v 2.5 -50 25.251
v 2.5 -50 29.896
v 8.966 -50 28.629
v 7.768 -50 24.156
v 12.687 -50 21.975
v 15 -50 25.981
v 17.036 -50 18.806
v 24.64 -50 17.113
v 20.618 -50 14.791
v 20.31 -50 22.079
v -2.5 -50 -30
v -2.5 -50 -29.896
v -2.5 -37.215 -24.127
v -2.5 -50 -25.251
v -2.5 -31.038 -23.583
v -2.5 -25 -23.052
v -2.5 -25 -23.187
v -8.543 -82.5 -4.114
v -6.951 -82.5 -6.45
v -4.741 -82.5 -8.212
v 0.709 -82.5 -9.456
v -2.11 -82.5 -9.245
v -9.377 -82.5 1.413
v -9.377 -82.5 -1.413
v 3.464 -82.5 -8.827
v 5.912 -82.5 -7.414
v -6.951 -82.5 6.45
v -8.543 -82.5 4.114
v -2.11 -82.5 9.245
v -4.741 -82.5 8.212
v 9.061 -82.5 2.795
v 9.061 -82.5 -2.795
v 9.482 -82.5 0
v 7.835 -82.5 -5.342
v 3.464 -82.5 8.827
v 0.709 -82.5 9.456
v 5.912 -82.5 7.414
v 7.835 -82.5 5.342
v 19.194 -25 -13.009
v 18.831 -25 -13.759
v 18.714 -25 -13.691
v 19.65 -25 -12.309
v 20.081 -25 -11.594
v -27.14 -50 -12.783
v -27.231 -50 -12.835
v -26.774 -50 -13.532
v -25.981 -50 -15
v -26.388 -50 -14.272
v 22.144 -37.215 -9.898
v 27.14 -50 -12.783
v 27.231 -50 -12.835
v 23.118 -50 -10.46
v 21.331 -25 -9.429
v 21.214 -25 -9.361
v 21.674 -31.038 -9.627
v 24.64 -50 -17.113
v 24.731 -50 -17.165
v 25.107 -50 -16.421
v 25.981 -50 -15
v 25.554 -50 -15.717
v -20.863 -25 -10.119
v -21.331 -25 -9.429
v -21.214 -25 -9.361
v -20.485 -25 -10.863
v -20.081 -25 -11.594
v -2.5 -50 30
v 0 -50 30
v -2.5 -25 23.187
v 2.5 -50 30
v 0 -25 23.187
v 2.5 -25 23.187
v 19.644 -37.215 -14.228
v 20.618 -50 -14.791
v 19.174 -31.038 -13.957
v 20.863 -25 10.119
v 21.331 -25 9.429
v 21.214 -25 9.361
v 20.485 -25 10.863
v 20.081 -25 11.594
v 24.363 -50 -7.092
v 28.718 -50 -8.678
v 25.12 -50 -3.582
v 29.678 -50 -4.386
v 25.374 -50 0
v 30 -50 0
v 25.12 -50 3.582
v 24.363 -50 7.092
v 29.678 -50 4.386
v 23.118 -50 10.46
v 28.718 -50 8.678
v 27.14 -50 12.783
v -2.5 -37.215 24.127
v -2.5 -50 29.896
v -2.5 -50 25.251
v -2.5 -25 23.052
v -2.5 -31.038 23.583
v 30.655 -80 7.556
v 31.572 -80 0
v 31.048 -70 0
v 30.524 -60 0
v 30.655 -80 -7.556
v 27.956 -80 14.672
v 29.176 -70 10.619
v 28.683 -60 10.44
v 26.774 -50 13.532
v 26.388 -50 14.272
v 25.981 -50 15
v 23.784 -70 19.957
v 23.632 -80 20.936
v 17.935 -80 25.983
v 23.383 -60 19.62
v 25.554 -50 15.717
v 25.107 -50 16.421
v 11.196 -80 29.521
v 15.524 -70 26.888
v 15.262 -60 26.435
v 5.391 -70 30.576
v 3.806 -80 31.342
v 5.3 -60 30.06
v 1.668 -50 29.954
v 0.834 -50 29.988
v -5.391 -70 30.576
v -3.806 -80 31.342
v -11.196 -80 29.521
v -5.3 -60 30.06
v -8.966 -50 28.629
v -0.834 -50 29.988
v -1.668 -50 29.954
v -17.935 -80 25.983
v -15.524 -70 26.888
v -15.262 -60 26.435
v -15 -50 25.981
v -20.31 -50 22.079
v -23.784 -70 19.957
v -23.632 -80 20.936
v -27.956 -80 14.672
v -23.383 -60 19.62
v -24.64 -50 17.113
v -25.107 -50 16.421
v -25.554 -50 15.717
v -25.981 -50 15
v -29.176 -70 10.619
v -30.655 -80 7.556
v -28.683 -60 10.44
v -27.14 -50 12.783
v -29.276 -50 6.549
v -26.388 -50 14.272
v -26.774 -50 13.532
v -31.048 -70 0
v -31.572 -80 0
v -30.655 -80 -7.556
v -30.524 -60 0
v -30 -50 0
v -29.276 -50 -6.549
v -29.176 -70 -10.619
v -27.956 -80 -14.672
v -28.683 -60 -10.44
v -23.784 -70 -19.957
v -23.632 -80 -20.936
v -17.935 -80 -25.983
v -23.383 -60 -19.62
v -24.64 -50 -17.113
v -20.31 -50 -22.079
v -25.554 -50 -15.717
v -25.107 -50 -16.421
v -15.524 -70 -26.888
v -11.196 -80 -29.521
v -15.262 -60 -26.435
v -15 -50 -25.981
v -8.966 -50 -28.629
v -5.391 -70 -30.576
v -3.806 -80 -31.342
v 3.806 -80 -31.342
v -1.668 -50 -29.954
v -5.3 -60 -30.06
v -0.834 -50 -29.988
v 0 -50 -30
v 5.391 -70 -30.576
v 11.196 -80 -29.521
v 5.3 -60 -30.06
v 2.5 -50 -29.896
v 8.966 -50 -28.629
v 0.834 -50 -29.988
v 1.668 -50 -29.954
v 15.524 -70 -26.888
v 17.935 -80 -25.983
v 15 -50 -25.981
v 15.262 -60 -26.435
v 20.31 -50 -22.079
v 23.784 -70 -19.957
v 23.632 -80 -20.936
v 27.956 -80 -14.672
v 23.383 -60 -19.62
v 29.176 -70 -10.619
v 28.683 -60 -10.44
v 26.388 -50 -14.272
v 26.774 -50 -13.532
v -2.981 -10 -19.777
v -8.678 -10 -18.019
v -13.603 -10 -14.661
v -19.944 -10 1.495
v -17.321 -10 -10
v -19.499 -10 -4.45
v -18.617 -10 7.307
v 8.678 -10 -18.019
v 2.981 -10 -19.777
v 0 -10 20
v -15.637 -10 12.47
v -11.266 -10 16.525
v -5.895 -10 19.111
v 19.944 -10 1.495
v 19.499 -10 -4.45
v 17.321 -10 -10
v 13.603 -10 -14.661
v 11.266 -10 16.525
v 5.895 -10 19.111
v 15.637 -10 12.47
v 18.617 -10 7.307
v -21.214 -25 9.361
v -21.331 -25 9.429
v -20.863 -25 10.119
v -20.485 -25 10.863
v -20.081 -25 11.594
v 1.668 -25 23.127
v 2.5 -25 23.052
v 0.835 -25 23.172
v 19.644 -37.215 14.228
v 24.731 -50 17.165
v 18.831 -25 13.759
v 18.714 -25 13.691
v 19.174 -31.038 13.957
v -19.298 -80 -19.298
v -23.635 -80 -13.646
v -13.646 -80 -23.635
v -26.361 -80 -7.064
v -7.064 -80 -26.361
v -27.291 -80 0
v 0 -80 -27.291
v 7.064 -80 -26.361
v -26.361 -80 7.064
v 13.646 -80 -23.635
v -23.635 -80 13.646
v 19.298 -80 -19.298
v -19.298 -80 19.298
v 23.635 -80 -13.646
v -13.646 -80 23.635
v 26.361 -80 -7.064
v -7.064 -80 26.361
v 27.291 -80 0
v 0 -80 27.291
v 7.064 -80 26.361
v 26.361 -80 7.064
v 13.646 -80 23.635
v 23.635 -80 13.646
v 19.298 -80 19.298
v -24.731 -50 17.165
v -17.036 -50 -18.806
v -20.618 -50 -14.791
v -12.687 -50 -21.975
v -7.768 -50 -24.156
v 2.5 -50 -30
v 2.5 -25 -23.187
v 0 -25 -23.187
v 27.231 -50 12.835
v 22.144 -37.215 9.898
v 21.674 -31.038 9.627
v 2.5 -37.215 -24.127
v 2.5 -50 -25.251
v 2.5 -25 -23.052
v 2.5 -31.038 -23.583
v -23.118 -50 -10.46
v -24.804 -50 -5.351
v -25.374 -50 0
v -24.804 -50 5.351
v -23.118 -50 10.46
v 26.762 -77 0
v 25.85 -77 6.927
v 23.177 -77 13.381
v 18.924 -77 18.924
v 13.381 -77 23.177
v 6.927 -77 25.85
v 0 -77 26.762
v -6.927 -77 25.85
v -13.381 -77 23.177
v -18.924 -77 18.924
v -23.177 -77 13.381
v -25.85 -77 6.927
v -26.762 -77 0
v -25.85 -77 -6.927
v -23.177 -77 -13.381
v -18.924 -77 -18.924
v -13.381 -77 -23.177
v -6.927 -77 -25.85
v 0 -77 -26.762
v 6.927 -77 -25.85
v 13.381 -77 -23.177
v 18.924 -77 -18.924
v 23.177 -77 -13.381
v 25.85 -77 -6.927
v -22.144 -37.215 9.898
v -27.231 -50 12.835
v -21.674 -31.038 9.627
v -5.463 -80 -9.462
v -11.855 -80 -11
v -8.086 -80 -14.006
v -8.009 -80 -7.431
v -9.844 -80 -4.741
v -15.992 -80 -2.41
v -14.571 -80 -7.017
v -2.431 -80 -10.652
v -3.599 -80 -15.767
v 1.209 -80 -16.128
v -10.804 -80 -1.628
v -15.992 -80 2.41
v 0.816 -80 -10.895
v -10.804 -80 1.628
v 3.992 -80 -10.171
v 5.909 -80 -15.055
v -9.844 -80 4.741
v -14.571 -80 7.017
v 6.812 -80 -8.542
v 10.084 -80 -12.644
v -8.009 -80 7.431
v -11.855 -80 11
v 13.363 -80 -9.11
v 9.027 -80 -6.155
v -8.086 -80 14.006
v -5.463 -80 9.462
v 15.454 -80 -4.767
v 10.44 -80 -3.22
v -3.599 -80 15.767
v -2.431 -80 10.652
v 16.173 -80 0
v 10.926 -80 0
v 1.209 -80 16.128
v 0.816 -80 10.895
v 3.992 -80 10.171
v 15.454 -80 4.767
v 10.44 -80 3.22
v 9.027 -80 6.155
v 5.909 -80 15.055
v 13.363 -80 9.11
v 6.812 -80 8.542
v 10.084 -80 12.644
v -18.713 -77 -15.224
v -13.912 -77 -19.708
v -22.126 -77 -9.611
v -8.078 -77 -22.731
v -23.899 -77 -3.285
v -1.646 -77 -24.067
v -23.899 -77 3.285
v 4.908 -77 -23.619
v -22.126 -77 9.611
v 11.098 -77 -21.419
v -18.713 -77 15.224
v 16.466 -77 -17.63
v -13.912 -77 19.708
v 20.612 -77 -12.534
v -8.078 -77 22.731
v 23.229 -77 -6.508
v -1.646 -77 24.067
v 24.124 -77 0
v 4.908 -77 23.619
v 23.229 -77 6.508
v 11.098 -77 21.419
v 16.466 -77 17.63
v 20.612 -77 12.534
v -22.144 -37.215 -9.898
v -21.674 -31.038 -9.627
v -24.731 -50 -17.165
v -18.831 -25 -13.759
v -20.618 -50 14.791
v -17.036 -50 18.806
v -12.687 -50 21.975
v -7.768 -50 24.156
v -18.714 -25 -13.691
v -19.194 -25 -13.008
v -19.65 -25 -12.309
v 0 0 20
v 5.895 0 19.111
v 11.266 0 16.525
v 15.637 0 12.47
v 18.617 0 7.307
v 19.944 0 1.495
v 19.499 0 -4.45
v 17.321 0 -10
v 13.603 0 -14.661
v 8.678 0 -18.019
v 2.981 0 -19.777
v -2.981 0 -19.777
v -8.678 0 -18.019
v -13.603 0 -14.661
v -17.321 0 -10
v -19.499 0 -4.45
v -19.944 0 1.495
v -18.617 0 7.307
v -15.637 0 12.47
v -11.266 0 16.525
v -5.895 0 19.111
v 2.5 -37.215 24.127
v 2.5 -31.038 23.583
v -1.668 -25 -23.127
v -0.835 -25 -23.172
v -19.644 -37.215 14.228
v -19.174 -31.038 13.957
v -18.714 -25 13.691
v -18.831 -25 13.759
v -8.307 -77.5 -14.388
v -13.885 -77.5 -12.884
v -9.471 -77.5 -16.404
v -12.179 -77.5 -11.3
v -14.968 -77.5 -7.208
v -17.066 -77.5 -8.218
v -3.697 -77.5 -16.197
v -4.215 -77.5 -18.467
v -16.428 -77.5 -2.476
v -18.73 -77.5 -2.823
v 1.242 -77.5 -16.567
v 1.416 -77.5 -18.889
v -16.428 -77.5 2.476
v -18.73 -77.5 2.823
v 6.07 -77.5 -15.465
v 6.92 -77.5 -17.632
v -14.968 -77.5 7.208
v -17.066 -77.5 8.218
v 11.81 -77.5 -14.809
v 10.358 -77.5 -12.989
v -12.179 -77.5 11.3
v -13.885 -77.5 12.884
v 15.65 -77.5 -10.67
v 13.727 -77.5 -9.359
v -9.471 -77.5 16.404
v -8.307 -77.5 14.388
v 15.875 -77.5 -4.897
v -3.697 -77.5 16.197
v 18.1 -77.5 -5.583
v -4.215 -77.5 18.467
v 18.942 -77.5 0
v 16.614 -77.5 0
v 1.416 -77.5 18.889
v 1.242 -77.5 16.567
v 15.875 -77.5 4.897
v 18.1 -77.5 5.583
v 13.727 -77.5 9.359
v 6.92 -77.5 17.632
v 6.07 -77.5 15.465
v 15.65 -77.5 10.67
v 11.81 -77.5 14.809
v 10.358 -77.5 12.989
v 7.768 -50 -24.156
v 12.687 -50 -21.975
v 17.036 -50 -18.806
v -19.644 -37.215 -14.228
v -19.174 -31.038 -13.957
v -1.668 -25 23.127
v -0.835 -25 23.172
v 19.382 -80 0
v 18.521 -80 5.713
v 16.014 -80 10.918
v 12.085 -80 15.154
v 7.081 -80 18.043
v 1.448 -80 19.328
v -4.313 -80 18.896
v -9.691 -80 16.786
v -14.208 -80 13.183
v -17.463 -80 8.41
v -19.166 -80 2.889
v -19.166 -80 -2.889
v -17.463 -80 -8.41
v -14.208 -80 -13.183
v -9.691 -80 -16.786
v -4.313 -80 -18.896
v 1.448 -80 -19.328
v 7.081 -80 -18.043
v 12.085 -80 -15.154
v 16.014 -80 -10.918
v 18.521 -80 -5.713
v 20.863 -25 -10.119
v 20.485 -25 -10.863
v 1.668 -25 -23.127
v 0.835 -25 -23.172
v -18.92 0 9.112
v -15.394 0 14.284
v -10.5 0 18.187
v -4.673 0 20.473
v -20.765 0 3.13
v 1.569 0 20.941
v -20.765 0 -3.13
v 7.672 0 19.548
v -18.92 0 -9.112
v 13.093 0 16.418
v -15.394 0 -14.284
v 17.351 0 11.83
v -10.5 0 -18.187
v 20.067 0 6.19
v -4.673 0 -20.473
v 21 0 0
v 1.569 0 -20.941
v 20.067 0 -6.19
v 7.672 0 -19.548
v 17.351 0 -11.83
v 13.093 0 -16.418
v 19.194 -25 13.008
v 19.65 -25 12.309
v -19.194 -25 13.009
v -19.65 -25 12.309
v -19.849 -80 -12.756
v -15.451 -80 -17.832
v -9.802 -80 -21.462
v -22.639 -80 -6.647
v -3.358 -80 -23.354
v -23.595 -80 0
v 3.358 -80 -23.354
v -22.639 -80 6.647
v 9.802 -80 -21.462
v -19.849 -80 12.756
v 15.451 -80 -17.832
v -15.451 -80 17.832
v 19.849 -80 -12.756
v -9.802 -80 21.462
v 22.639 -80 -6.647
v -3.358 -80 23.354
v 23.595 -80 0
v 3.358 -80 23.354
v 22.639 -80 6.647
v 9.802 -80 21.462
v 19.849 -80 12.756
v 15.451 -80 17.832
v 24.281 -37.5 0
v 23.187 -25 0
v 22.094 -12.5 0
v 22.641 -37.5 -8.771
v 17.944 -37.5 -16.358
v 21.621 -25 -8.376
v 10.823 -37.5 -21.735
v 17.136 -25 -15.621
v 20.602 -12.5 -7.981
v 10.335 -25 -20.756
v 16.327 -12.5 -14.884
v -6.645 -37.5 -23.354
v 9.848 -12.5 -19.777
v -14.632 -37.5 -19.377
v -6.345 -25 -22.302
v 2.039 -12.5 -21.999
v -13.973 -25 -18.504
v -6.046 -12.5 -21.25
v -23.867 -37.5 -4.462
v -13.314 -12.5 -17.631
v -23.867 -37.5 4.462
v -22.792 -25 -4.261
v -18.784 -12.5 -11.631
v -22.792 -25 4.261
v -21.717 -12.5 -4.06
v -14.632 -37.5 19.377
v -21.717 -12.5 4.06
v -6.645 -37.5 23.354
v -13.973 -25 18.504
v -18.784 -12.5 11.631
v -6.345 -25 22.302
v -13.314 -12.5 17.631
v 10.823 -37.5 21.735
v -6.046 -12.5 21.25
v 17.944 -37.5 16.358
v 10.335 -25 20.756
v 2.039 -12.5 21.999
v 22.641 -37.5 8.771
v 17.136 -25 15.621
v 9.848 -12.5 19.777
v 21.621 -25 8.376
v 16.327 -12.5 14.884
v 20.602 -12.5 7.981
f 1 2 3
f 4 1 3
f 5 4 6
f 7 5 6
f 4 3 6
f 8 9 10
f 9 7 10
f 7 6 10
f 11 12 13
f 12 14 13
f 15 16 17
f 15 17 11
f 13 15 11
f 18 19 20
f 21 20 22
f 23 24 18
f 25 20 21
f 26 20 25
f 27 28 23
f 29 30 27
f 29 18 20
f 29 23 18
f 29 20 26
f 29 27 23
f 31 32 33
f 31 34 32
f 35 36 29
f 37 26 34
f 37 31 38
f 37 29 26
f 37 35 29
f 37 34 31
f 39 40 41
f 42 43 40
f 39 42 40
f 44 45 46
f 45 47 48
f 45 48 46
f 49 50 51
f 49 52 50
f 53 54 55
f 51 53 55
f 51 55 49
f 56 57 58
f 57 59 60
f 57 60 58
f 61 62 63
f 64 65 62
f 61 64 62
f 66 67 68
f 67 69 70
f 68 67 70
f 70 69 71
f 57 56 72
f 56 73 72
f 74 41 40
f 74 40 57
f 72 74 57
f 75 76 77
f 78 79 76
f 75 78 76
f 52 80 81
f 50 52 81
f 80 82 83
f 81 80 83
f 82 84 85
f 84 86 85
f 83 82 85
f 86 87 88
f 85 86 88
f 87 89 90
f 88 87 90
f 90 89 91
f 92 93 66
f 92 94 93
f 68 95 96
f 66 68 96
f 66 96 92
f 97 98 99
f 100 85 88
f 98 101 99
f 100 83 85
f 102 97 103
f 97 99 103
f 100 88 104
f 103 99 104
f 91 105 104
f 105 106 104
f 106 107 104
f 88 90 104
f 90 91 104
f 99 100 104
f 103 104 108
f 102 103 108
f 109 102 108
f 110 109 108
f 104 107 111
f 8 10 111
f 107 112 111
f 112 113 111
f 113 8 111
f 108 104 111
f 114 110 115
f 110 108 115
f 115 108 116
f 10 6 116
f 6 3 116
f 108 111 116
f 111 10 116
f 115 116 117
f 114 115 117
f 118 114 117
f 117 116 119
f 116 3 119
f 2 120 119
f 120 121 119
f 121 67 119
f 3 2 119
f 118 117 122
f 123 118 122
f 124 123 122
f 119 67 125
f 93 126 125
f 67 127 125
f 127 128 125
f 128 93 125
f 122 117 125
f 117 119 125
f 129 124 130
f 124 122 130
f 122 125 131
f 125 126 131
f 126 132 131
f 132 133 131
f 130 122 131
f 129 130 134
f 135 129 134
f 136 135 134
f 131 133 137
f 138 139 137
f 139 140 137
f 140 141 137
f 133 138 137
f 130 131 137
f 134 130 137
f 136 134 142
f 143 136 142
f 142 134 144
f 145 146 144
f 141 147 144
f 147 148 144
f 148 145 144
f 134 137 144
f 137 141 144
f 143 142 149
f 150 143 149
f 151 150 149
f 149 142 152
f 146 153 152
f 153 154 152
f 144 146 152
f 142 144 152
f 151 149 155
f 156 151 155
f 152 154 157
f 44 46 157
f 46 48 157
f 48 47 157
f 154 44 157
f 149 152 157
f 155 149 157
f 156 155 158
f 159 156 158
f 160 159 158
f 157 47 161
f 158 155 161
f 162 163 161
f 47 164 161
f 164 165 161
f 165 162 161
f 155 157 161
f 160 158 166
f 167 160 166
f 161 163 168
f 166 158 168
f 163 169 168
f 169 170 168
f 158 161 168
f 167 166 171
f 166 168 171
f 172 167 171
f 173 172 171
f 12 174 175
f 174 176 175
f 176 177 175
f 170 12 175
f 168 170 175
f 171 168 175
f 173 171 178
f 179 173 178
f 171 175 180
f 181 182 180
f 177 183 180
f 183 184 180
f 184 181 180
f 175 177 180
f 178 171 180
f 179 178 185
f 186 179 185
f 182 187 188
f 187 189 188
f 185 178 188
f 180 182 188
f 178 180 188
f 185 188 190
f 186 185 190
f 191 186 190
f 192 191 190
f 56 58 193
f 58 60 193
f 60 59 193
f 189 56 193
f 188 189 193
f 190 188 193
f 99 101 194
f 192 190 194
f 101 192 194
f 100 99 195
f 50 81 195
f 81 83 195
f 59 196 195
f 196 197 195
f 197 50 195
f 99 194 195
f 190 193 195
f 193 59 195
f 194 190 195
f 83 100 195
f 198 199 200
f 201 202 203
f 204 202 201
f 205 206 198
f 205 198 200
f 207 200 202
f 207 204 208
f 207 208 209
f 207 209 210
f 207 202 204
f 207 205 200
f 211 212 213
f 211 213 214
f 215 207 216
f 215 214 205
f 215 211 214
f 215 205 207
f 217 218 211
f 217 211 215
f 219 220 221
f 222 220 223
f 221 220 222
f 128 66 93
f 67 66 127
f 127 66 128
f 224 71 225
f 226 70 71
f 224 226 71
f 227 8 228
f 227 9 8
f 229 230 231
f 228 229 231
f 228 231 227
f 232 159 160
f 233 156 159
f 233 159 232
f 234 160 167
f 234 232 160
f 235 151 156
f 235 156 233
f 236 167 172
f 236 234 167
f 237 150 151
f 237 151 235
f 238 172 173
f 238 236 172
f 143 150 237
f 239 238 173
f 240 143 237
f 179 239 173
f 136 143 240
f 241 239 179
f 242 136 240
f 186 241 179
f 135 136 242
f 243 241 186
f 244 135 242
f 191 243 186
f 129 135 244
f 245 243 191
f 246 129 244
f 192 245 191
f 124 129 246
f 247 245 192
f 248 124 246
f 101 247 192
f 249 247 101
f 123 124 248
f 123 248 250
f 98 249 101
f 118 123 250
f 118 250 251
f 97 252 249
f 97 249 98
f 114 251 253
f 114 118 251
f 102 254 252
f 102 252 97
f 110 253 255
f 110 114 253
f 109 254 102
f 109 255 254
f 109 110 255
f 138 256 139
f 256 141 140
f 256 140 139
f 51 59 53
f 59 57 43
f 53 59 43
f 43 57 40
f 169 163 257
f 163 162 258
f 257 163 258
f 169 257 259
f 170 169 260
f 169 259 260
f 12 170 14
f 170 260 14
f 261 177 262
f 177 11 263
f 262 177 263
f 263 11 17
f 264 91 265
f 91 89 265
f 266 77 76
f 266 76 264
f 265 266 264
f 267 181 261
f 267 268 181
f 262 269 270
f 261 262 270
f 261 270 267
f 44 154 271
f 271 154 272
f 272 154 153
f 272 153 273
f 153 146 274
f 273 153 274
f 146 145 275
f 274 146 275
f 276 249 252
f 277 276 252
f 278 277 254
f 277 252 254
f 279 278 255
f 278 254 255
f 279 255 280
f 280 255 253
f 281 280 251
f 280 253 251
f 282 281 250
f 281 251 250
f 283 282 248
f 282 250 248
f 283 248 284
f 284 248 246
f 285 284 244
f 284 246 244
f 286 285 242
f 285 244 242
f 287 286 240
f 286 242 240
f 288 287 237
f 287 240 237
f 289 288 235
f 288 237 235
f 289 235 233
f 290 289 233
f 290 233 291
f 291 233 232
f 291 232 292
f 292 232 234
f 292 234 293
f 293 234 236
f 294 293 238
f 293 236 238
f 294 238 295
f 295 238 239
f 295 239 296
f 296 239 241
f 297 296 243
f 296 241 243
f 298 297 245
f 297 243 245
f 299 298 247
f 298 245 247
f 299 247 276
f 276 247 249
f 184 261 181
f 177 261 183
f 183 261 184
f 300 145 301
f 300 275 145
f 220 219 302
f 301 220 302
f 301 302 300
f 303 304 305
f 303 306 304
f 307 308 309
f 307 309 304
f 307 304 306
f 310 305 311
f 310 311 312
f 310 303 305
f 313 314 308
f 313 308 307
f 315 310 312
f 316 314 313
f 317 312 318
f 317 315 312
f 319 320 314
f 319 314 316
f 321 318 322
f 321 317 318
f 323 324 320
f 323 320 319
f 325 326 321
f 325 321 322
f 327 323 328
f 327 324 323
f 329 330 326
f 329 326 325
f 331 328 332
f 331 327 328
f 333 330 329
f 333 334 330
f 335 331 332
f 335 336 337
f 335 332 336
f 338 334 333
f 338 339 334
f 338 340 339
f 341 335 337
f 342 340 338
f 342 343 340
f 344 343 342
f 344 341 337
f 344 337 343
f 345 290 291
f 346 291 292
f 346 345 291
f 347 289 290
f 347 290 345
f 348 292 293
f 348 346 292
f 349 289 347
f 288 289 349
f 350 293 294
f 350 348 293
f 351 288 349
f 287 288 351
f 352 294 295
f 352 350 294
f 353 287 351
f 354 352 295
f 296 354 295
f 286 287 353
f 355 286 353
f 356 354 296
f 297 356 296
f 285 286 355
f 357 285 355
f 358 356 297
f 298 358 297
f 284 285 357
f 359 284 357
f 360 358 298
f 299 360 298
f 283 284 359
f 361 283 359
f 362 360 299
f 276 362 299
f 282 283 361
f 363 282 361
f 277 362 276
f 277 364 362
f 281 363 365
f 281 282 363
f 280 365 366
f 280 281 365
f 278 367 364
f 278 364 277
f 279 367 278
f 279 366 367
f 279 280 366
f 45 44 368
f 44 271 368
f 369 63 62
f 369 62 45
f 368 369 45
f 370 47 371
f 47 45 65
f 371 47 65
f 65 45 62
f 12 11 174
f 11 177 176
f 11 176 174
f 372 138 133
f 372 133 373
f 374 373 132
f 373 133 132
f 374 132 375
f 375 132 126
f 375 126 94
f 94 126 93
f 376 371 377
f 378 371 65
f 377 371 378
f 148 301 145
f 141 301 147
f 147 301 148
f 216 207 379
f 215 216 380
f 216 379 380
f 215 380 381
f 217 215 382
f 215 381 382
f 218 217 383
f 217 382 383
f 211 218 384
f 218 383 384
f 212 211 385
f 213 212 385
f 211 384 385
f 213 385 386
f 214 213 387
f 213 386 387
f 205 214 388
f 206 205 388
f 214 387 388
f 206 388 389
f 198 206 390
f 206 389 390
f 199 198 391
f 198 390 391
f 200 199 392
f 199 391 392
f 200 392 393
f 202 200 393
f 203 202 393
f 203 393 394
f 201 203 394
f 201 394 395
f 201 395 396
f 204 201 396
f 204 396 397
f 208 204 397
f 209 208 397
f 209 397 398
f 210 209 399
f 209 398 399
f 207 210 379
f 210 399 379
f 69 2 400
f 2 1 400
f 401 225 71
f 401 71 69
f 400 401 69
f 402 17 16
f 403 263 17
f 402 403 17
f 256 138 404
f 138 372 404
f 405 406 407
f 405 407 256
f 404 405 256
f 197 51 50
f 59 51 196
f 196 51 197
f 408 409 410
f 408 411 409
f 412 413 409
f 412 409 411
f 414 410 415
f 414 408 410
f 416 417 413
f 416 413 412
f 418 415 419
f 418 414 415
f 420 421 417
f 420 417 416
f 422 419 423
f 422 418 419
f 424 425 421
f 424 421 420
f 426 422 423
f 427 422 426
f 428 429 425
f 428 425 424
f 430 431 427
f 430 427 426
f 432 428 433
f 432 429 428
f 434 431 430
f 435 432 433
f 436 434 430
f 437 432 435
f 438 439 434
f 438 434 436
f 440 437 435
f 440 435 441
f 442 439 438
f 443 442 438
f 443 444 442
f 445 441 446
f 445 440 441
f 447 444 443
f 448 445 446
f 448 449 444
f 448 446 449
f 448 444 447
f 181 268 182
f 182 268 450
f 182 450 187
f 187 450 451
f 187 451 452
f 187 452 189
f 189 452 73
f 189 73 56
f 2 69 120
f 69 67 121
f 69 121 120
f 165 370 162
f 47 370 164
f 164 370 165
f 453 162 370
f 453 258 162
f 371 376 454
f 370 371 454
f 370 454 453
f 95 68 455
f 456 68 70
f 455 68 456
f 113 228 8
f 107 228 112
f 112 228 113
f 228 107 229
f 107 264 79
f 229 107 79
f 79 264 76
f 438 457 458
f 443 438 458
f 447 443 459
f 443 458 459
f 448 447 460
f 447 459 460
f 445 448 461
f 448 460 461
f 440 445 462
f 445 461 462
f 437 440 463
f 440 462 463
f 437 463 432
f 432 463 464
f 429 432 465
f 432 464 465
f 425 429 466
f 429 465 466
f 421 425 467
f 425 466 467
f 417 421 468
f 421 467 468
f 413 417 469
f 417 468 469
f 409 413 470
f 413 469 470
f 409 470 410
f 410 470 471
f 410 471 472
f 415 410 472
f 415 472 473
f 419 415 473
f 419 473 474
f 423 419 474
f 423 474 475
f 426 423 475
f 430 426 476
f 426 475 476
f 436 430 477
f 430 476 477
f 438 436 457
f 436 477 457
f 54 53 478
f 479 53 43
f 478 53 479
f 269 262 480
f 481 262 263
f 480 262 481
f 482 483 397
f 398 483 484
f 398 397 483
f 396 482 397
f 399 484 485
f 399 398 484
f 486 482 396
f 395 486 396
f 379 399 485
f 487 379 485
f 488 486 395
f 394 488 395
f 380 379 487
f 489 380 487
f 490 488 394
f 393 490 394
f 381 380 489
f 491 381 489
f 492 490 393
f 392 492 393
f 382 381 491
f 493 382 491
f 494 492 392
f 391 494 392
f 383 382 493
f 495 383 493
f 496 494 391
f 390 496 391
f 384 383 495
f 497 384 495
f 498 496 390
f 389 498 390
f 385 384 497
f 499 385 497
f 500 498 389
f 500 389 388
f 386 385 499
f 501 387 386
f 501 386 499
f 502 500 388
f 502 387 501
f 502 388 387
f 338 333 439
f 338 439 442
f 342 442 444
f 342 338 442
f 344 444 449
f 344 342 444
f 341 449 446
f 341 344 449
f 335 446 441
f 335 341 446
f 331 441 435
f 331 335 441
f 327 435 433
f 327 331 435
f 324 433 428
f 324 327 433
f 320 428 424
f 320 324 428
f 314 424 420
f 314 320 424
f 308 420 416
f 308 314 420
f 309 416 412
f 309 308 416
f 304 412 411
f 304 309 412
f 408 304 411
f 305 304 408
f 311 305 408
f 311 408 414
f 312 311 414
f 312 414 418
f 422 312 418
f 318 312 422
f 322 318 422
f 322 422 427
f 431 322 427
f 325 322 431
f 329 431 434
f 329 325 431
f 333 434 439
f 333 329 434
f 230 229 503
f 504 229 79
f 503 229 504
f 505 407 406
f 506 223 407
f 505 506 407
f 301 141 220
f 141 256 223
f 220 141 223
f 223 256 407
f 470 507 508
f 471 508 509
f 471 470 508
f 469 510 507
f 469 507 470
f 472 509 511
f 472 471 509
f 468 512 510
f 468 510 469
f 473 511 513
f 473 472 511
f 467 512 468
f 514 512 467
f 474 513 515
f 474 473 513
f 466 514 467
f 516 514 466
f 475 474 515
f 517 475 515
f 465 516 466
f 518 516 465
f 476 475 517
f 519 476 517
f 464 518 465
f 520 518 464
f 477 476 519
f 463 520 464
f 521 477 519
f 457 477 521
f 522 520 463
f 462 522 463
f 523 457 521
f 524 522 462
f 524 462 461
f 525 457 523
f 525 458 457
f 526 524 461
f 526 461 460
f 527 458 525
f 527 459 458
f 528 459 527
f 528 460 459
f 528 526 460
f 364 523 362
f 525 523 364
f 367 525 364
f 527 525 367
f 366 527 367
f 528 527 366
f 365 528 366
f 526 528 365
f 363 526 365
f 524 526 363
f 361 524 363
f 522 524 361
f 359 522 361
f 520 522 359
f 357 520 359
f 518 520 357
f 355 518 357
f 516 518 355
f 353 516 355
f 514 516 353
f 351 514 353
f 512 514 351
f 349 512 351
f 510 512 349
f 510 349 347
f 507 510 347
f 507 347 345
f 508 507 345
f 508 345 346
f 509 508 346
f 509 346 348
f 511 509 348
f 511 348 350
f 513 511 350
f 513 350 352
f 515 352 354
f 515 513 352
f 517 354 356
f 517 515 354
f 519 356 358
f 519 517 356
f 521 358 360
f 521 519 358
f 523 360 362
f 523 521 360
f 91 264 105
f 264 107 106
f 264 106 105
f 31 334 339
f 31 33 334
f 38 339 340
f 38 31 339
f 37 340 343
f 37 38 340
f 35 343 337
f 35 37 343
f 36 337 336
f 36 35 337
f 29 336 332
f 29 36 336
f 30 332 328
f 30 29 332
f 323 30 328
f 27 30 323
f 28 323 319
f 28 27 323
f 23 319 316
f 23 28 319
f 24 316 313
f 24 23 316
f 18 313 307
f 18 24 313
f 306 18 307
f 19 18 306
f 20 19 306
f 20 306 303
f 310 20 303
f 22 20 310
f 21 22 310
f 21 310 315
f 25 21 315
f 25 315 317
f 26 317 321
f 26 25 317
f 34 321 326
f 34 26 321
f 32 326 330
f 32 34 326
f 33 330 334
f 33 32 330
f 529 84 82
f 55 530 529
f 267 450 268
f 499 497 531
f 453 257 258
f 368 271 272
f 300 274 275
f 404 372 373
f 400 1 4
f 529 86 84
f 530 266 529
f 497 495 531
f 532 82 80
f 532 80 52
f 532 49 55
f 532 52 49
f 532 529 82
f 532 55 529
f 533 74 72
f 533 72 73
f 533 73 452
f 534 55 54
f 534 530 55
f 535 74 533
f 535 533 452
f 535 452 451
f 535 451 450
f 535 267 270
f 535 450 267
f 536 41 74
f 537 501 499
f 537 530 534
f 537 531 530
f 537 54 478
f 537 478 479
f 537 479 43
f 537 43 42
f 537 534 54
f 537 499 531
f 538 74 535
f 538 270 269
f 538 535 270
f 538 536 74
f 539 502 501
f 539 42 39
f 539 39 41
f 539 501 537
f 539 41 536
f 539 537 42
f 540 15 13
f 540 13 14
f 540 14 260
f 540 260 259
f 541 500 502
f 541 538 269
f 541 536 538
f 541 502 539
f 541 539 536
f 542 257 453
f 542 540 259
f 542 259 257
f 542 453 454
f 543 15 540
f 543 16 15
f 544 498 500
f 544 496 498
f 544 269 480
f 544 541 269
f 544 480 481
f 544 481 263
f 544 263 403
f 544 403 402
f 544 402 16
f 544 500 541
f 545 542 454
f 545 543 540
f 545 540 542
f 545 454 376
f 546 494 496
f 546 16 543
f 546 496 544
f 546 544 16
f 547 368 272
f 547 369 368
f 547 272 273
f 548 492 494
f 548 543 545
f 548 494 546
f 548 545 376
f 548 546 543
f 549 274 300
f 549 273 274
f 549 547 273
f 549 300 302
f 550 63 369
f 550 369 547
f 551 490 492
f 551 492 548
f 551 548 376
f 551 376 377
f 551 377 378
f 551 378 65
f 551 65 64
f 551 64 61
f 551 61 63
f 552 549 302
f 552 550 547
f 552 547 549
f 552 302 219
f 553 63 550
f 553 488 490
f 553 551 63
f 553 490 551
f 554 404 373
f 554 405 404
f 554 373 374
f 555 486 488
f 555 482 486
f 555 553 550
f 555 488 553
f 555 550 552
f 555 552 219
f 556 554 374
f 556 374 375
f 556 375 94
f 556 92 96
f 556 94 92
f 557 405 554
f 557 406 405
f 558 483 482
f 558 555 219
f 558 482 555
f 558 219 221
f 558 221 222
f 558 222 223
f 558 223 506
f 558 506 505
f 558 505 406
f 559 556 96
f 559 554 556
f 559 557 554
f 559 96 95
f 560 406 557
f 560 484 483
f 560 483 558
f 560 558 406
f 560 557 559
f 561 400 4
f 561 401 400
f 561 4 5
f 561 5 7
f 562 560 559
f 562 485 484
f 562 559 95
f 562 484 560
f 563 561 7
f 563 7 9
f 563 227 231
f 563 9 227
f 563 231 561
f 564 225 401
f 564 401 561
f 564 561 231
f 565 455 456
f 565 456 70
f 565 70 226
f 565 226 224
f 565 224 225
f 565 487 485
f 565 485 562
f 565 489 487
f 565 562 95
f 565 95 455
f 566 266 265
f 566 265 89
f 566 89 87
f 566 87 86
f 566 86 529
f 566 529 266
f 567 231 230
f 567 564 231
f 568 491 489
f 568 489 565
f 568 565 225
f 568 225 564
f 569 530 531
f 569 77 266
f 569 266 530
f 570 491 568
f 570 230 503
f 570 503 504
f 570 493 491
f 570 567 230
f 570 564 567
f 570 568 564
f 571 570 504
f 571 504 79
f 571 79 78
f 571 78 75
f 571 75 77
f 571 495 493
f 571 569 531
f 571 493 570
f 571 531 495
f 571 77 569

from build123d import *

# Parameters (mm, degrees)
SKETCH1_R           = 21
BOSS_EXTRUDE1_DEPTH = 50
BOSS_EXTRUDE1_DRAFT = 5
SKETCH2_R           = 30
BOSS_EXTRUDE2_DEPTH = 30
BOSS_EXTRUDE2_DRAFT = -3
BOSS_EXTRUDE3_DEPTH = 2.5
CIRPATTERN1_COUNT   = 6
SKETCH4_R           = 27.291330602
SKETCH4_R_2         = 23.594608396
CUT_EXTRUDE1_DEPTH  = 3
CUT_EXTRUDE1_DRAFT  = -10
SKETCH5_R           = 19.382333363
SKETCH5_R_2         = 16.172751495
CUT_EXTRUDE2_DEPTH  = 2.5
CUT_EXTRUDE2_DRAFT  = -10
SKETCH6_R           = 10.925848264
BOSS_EXTRUDE4_DEPTH = 2.5
BOSS_EXTRUDE4_TAPER = 30
SKETCH7_R           = 20
CUT_EXTRUDE3_DEPTH  = 10


with BuildPart() as part:
    # Sketch1 → Boss-Extrude1 (with draft: the straight prism first)
    with BuildSketch(Plane(origin=(0, 0, 0), x_dir=(1, 0, 0), z_dir=(0, 1, 0))):
        Circle(SKETCH1_R)
    extrude(amount=-BOSS_EXTRUDE1_DEPTH)
    # Boss-Extrude1: the draft: its side faces are tilted about the plane it starts from
    boss_extrude1_sides = [part.faces().sort_by_distance(p)[0] for p in [
        (-21, -25, 0),
    ]]
    draft(boss_extrude1_sides, Plane(origin=(0, 0, 0), x_dir=(1, 0, 0), z_dir=(0, 1, 0)), BOSS_EXTRUDE1_DRAFT)


with BuildPart() as boss_extrude2_tool:
    # Sketch2 → Boss-Extrude2 (with draft: the straight prism first)
    with BuildSketch(Plane.XZ.offset(50)):
        Circle(SKETCH2_R)
    extrude(amount=BOSS_EXTRUDE2_DEPTH)
    # Boss-Extrude2: the draft: its side faces are tilted about the plane it starts from
    boss_extrude2_sides = [boss_extrude2_tool.faces().sort_by_distance(p)[0] for p in [
        (-30, -65, 0),
    ]]
    draft(boss_extrude2_sides, Plane.XZ.offset(50), BOSS_EXTRUDE2_DRAFT)


with BuildPart() as part_1:
    add(part.part)

    # Boss-Extrude2: add boss_extrude2_tool
    add(boss_extrude2_tool.part)

    # Sketch3 → Boss-Extrude3 (add, symmetric)
    with BuildSketch(Plane(origin=(0, 0, 0), x_dir=(0, 0, -1), z_dir=(1, 0, 0))):
        Polygon((-25.374433176, -50), (-30, -50), (-23.187216588, -25), (-20.280513913, -25), (-22.467730501, -50), align=None)
    boss_extrude3 = extrude(amount=BOSS_EXTRUDE3_DEPTH, both=True)

    # CirPattern1: Boss-Extrude3 ×6 about axis
    cirpattern1_axis = Axis((0, 0, 0), (0, 1, 0))
    for i in range(1, CIRPATTERN1_COUNT):
        add(boss_extrude3.rotate(cirpattern1_axis, i * 360 / CIRPATTERN1_COUNT))


with BuildPart() as cut_extrude1_tool:
    # Sketch4 → Cut-Extrude1 (with draft: the straight prism first)
    with BuildSketch(Plane.XZ.offset(80)):
        Circle(SKETCH4_R)
        Circle(SKETCH4_R_2, mode=Mode.SUBTRACT)
    extrude(amount=-CUT_EXTRUDE1_DEPTH)
    # Cut-Extrude1: the draft: its side faces are tilted about the plane it starts from
    cut_extrude1_sides = [cut_extrude1_tool.faces().sort_by_distance(p)[0] for p in [
        (-27.291330602, -78.5, 0),
        (-23.594608396, -78.5, 0),
    ]]
    draft(cut_extrude1_sides, Plane.XZ.offset(80), CUT_EXTRUDE1_DRAFT)


with BuildPart() as part_2:
    add(part_1.part)

    # Cut-Extrude1: cut by cut_extrude1_tool
    add(cut_extrude1_tool.part, mode=Mode.SUBTRACT)


with BuildPart() as cut_extrude2_tool:
    # Sketch5 → Cut-Extrude2 (with draft: the straight prism first)
    with BuildSketch(Plane.XZ.offset(80)):
        Circle(SKETCH5_R)
        Circle(SKETCH5_R_2, mode=Mode.SUBTRACT)
    extrude(amount=-CUT_EXTRUDE2_DEPTH)
    # Cut-Extrude2: the draft: its side faces are tilted about the plane it starts from
    cut_extrude2_sides = [cut_extrude2_tool.faces().sort_by_distance(p)[0] for p in [
        (-19.382333363, -78.75, 0),
        (-16.172751495, -78.75, 0),
    ]]
    draft(cut_extrude2_sides, Plane.XZ.offset(80), CUT_EXTRUDE2_DRAFT)


with BuildPart() as part_3:
    add(part_2.part)

    # Cut-Extrude2: cut by cut_extrude2_tool
    add(cut_extrude2_tool.part, mode=Mode.SUBTRACT)

    # Sketch6 → Boss-Extrude4 (add)
    with BuildSketch(Plane.XZ.offset(80)):
        Circle(SKETCH6_R)
    extrude(amount=BOSS_EXTRUDE4_DEPTH, taper=BOSS_EXTRUDE4_TAPER)

    # Sketch7 → Cut-Extrude3 (cut)
    with BuildSketch(Plane(origin=(0, 0, 0), x_dir=(1, 0, 0), z_dir=(0, 1, 0))):
        with Locations(Location((0, 0, 0), (0, 0, 270))):
            Circle(SKETCH7_R)
    extrude(amount=-CUT_EXTRUDE3_DEPTH, mode=Mode.SUBTRACT)


solid = part_3.part
